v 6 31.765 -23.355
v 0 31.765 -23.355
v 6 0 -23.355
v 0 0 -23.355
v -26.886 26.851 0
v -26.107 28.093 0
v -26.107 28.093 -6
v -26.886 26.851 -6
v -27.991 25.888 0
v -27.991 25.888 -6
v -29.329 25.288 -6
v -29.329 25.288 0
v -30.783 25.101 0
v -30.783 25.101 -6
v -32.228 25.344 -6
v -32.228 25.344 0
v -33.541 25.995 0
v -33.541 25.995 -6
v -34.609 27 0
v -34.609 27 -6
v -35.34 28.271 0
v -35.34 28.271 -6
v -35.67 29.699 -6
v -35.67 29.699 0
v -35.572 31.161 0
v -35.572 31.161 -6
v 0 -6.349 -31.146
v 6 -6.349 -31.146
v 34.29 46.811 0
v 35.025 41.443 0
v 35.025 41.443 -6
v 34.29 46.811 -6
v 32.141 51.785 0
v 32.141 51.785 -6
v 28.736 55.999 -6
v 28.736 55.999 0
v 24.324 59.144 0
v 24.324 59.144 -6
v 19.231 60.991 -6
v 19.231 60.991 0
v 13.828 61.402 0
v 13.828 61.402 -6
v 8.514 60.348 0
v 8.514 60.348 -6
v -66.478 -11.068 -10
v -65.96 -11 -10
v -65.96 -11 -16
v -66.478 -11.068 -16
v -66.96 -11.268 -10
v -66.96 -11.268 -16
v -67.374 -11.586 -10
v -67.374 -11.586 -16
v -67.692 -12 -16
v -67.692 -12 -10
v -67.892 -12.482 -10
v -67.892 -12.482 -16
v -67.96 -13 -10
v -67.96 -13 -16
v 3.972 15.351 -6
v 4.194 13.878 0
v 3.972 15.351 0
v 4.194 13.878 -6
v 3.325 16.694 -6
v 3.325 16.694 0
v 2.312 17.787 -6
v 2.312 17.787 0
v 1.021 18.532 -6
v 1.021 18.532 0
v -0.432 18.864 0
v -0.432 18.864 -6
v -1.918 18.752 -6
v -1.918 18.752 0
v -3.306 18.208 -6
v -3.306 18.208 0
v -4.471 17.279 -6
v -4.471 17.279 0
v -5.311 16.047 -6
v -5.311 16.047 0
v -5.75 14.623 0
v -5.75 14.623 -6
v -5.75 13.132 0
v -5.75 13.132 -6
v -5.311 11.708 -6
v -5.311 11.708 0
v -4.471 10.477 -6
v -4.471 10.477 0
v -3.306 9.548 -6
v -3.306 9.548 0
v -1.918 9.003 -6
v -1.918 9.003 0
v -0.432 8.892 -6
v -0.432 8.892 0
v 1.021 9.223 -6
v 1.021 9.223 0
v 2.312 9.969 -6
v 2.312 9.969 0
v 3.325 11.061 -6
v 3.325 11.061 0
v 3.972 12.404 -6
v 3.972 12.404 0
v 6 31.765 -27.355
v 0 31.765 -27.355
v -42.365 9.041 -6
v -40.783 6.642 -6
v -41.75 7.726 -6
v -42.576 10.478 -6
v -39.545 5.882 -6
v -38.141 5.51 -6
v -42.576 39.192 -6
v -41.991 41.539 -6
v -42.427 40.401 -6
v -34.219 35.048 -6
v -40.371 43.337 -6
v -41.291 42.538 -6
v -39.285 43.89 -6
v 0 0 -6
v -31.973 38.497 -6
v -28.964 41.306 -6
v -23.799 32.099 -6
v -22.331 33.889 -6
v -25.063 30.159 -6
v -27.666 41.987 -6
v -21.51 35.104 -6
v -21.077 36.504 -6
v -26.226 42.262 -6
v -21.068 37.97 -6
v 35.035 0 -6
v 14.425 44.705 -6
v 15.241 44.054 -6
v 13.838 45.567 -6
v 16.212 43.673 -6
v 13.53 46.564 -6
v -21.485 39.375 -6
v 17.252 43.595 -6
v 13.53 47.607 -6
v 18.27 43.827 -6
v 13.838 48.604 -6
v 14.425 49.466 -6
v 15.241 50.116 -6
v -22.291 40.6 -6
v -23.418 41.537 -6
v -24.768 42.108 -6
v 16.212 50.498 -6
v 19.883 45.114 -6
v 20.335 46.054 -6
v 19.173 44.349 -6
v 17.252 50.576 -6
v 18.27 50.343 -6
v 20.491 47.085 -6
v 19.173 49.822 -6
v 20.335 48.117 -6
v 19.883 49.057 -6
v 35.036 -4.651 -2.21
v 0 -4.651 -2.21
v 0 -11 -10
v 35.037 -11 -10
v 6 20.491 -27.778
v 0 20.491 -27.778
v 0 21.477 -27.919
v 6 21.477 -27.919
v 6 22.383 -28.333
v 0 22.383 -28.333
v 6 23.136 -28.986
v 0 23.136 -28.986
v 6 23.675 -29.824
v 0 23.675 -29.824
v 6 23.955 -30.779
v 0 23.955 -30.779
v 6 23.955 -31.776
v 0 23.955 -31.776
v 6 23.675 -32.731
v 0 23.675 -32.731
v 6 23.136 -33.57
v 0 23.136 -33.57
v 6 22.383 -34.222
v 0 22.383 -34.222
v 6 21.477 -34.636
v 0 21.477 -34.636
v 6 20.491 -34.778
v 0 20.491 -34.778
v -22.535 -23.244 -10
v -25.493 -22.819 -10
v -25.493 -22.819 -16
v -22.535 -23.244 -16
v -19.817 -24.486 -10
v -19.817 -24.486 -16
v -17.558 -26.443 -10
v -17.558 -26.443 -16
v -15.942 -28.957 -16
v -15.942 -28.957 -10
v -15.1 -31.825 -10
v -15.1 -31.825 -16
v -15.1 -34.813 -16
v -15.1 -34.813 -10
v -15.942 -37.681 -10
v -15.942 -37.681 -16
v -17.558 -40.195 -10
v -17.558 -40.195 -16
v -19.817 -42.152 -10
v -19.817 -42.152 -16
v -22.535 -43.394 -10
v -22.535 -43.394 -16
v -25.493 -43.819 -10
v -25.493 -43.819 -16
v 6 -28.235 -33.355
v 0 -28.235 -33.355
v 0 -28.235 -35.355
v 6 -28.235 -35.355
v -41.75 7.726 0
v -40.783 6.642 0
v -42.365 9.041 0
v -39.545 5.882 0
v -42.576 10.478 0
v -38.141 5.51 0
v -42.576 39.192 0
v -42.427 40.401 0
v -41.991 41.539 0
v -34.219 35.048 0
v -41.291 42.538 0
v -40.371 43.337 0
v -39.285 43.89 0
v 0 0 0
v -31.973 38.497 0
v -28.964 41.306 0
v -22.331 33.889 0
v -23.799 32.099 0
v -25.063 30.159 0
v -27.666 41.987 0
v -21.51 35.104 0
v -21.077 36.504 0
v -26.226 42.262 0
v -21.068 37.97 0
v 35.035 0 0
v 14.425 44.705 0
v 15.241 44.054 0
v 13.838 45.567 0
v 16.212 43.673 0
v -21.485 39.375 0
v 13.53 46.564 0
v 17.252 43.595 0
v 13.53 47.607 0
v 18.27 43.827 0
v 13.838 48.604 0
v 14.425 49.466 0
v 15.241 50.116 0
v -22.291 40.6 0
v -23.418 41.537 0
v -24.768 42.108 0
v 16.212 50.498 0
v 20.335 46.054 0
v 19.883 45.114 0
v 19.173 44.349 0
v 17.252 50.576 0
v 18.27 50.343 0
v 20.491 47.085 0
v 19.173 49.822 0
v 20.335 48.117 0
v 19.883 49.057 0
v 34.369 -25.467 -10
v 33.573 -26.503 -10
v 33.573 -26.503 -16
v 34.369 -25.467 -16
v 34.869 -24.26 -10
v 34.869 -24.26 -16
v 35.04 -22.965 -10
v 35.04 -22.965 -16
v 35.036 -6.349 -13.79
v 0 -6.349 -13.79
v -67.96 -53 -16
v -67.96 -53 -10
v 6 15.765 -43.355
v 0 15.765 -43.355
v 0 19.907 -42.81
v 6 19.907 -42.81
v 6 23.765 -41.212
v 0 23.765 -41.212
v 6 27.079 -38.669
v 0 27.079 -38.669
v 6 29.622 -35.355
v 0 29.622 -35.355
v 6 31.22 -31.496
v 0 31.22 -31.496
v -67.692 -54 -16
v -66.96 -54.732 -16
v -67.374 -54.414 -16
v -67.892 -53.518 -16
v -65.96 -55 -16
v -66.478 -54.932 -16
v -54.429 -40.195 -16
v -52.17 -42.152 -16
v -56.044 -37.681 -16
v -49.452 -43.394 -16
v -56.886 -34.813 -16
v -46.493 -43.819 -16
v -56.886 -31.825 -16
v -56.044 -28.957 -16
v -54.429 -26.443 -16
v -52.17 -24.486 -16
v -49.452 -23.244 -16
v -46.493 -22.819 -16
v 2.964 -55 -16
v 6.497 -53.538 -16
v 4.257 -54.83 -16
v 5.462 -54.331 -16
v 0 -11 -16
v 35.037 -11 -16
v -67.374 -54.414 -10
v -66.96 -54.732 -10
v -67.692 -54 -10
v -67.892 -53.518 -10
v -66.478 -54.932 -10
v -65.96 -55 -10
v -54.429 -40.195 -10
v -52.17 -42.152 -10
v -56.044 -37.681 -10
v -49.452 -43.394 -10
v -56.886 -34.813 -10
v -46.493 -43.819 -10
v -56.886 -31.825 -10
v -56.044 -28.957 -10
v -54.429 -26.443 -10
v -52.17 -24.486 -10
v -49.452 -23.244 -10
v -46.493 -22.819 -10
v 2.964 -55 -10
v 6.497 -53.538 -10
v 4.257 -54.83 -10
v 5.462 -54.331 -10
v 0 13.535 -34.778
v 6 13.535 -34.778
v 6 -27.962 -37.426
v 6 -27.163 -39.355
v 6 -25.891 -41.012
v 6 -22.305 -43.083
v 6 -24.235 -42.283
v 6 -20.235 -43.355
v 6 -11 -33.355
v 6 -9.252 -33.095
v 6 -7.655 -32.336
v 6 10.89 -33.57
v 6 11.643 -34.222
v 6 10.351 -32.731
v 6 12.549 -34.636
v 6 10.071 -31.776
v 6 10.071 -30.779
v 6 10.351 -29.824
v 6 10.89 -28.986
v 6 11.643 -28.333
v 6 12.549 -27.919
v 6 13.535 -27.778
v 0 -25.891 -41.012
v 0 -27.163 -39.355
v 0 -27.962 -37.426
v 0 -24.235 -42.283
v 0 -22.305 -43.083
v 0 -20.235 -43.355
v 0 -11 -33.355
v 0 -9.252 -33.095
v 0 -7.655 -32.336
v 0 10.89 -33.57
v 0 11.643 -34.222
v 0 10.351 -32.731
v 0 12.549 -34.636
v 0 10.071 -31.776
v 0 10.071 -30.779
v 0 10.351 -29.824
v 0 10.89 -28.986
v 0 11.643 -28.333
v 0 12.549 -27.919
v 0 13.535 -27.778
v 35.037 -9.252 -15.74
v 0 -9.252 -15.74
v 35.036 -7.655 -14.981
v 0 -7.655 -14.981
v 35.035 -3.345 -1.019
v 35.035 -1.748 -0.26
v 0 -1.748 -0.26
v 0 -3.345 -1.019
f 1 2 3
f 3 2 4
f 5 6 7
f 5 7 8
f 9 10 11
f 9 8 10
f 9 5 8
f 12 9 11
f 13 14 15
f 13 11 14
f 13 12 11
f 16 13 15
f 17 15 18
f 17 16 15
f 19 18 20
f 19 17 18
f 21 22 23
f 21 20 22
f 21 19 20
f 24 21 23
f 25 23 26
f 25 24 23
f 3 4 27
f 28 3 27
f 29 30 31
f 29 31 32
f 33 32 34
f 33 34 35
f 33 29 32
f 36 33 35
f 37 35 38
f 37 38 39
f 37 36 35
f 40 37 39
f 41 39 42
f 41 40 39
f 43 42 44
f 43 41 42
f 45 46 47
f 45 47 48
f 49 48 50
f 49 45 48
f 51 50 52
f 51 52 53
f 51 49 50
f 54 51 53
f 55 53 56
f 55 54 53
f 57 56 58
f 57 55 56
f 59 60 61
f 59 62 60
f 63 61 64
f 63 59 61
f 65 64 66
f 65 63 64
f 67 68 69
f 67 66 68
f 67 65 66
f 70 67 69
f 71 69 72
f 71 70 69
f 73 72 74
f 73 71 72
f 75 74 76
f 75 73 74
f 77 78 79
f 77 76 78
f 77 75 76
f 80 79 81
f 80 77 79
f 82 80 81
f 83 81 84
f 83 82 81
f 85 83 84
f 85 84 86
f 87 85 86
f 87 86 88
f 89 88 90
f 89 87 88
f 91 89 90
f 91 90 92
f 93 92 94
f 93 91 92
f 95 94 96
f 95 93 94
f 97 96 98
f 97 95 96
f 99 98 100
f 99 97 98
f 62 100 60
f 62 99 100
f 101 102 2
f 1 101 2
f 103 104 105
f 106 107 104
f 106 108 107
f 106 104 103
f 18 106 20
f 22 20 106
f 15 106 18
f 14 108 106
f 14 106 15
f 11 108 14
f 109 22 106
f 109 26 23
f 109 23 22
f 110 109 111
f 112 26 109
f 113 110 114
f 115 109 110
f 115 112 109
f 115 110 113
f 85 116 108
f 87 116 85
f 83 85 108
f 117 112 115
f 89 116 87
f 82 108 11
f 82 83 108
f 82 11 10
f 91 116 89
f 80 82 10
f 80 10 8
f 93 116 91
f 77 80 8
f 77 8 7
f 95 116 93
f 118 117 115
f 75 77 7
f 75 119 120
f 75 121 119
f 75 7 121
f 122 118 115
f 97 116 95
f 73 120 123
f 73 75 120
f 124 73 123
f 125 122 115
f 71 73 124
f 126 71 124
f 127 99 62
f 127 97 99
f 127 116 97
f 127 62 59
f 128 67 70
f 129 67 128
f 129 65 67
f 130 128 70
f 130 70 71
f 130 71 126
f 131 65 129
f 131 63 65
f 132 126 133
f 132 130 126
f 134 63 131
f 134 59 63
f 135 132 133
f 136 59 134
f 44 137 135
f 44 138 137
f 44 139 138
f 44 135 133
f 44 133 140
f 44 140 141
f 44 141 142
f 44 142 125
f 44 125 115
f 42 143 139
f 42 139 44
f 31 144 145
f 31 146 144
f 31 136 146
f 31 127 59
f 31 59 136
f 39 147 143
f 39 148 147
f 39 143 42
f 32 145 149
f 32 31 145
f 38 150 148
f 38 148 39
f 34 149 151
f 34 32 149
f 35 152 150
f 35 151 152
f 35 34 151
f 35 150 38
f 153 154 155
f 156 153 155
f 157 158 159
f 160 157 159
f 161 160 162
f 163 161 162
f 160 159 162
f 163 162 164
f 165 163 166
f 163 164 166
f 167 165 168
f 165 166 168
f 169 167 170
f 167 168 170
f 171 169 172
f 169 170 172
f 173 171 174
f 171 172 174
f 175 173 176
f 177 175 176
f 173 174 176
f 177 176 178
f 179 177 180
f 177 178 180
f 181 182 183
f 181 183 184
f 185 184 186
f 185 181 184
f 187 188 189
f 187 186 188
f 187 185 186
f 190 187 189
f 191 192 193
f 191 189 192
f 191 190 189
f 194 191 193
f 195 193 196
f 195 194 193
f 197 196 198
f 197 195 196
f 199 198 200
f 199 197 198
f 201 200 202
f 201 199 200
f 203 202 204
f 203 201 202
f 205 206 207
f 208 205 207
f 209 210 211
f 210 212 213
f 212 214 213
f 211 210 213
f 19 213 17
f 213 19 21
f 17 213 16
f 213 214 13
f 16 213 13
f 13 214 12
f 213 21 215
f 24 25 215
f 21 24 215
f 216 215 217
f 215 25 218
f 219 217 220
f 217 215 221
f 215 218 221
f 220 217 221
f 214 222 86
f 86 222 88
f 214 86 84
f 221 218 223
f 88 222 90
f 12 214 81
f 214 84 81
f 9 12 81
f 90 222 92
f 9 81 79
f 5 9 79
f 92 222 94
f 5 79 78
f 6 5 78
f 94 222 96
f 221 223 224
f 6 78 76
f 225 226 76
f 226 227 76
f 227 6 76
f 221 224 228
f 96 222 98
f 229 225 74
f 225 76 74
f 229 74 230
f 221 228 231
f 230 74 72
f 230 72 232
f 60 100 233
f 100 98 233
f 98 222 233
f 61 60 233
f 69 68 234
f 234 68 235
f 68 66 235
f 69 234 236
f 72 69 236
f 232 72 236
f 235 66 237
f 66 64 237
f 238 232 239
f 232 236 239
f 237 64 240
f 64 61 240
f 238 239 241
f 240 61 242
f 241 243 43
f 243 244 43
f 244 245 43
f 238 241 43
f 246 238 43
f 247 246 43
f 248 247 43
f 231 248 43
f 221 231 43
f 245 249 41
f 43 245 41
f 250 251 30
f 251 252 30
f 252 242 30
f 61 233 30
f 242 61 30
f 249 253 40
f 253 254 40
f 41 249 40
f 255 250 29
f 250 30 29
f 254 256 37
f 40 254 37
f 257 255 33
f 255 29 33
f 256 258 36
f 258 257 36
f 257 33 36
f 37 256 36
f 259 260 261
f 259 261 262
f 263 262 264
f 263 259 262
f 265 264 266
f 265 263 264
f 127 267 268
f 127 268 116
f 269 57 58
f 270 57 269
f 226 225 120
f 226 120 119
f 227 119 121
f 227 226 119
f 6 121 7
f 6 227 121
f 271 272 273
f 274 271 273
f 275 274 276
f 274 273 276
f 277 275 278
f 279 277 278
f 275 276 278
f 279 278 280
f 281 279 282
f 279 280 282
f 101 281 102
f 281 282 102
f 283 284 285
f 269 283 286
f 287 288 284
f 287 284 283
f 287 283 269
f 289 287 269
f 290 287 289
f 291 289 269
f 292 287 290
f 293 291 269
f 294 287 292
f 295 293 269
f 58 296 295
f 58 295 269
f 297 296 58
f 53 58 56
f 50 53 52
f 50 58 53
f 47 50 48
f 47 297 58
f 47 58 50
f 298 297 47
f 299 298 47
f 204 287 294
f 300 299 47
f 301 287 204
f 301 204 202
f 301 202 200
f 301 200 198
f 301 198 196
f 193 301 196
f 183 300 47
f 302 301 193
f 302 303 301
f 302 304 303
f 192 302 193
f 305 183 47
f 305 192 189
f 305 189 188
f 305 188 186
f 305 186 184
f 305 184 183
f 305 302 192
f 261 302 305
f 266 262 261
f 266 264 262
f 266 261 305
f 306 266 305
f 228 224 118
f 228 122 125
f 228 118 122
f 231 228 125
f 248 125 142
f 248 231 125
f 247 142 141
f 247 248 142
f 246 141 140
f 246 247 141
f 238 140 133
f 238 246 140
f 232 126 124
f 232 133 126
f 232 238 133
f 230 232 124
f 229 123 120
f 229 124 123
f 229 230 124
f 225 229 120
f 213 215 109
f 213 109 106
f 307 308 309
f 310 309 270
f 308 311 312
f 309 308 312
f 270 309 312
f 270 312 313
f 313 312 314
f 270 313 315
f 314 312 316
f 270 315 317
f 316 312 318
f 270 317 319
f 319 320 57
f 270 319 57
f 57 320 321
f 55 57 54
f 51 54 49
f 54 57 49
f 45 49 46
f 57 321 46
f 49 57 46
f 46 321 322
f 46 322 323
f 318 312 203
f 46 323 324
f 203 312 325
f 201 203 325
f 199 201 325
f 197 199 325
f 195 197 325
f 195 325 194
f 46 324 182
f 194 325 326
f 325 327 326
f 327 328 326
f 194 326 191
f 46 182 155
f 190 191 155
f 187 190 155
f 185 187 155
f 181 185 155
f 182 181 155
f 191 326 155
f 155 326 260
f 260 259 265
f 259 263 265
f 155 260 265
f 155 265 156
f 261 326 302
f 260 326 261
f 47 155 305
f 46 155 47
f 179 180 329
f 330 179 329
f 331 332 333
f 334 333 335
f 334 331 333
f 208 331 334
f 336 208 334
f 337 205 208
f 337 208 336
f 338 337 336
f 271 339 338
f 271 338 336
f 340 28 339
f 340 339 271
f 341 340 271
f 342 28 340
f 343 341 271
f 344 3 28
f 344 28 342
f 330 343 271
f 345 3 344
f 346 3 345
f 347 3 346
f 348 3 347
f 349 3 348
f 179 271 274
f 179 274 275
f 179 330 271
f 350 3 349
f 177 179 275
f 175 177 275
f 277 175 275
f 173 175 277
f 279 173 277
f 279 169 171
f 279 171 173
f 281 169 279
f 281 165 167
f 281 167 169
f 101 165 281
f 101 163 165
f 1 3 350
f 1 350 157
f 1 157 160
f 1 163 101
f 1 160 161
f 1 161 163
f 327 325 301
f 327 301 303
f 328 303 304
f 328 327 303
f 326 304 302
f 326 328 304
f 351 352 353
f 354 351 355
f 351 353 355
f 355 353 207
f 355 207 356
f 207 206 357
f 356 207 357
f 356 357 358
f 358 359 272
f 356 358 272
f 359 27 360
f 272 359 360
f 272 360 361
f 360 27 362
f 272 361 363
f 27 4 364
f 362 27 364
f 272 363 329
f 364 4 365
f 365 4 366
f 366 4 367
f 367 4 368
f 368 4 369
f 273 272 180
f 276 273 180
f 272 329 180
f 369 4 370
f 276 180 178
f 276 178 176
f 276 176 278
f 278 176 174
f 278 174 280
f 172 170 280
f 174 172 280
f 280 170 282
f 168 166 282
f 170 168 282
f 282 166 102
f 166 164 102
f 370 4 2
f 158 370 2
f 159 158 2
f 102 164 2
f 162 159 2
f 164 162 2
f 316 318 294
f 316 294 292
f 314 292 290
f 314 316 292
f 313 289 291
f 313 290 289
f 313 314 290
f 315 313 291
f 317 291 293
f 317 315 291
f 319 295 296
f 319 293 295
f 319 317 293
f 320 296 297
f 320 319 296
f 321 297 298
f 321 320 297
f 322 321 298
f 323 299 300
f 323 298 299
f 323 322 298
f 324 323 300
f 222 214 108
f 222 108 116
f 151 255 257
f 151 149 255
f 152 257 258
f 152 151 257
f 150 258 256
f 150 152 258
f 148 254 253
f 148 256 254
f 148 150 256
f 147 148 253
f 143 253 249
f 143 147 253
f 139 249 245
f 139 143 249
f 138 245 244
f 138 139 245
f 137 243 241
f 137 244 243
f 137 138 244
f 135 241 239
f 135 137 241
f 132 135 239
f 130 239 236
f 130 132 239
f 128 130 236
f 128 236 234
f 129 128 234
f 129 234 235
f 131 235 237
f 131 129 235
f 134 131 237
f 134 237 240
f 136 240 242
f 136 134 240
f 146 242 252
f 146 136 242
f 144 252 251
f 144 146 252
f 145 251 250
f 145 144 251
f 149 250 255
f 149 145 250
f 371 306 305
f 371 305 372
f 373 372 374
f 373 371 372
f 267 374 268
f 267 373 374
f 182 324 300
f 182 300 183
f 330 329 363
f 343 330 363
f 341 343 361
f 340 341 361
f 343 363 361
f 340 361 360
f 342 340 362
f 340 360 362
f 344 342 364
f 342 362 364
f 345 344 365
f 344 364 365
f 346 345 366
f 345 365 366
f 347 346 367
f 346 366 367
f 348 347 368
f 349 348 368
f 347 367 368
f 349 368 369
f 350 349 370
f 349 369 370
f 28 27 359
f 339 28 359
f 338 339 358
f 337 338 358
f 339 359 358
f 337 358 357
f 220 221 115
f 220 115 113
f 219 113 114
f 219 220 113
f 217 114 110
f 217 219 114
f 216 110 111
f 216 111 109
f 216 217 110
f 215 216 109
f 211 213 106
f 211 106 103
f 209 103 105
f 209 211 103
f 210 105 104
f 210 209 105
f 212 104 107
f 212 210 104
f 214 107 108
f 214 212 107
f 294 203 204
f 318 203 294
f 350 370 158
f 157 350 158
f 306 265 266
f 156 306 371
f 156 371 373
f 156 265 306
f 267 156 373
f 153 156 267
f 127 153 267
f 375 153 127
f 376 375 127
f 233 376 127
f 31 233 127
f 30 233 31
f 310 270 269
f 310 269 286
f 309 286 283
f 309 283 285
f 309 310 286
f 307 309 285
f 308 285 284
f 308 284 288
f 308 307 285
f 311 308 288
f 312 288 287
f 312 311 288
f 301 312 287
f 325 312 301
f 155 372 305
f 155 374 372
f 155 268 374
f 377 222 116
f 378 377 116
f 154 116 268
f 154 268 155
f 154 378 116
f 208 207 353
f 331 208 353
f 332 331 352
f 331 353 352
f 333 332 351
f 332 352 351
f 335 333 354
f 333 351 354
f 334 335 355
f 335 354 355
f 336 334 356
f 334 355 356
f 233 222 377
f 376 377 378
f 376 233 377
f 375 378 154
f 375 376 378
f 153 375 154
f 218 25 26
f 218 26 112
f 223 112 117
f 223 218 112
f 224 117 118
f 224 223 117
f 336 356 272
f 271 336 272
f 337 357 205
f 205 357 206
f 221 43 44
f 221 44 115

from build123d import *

# Parameters (mm, degrees)
F0_R     = 5
F0_R_2   = 3.500005
F2_DEPTH = 50
F1_W     = 56.675658
F1_H     = 6
F1_W_2   = 79.885715
F3_DEPTH = 100
F4_DEPTH = 6


with BuildPart() as f2:
    # F0 (on Top) → F2 (new body, symmetric)
    with BuildSketch(Plane.XY):
        with BuildLine():
            Line((0, -11), (-65.959916, -11))
            ThreePointArc((-65.959916, -11), (-67.37413, -11.585786), (-67.959916, -13))
            Line((-67.959916, -13), (-67.959916, -53))
            ThreePointArc((-67.959916, -53), (-67.37413, -54.414214), (-65.959916, -55))
            Line((-65.959916, -55), (2.964258, -55))
            ThreePointArc((2.964258, -55), (4.875939, -54.620117), (6.497133, -53.538191))
            Line((6.497133, -53.538191), (33.572958, -26.503055))
            ThreePointArc((33.572958, -26.503055), (34.658762, -24.880017), (35.040084, -22.964863))
            Line((35.040084, -22.964863), (35.024943, 41.443182))
            ThreePointArc((35.024943, 41.443182), (26.636911, 57.721619), (8.513795, 60.348262))
            Line((8.513795, 60.348262), (-39.285382, 43.890292))
            ThreePointArc((-39.285382, 43.890292), (-41.671495, 42.059758), (-42.575934, 39.191592))
            Line((-42.575934, 39.191592), (-42.575934, 10.478197))
            ThreePointArc((-42.575934, 10.478197), (-41.306069, 7.148618), (-38.141498, 5.510286))
            Line((-38.141498, 5.510286), (0, 0))
            Line((0, 0), (0, -11))
        make_face()
        with BuildLine():
            ThreePointArc((-46.493332, -43.818958), (-56.993332, -33.318958), (-46.493332, -22.818958))
            Line((-46.493332, -22.818958), (-25.493332, -22.818958))
            ThreePointArc((-25.493332, -22.818958), (-14.993332, -33.318958), (-25.493332, -43.818958))
            Line((-25.493332, -43.818958), (-46.493332, -43.818958))
        make_face(mode=Mode.SUBTRACT)
        with BuildLine():
            ThreePointArc((-26.106866, 28.092718), (-32.228269, 25.343574), (-35.572339, 31.161354))
            ThreePointArc((-35.572339, 31.161354), (-33.200295, 36.840932), (-28.964332, 41.306447))
            ThreePointArc((-28.964332, 41.306447), (-22.291275, 40.59957), (-22.331264, 33.889296))
            ThreePointArc((-22.331264, 33.889296), (-24.457616, 31.146388), (-26.106866, 28.092718))
        make_face(mode=Mode.SUBTRACT)
        with Locations((-0.805872, 13.877689)):
            Circle(F0_R, mode=Mode.SUBTRACT)
        with Locations((16.990938, 47.085301)):
            Circle(F0_R_2, mode=Mode.SUBTRACT)
    extrude(amount=F2_DEPTH, both=True)

    # F1 (on Right) → F3 (intersect, symmetric)
    with BuildSketch(Plane.YZ):
        with Locations((-39.337829, -13)):
            Rectangle(F1_W, F1_H)
        with BuildLine():
            Line((0, -6), (0, 0))
            ThreePointArc((0, 0), (-2.574616, -0.580466), (-4.651073, -2.209549))
            Line((-4.651073, -2.209549), (-11, -10))
            Line((-11, -10), (-11, -16))
            ThreePointArc((-11, -16), (-8.425384, -15.419534), (-6.348927, -13.790451))
            Line((-6.348927, -13.790451), (0, -6))
        make_face()
        with Locations((39.942857, -3)):
            Rectangle(F1_W_2, F1_H)
    extrude(amount=F3_DEPTH, both=True, mode=Mode.INTERSECT)


with BuildPart() as f4:
    # F1 (on Right) → F4 (new body)
    with BuildSketch(Plane.YZ):
        with BuildLine():
            Line((31.765494, -23.355214), (0, -23.355214))
            Line((0, -23.355214), (-6.348927, -31.145665))
            ThreePointArc((-6.348927, -31.145665), (-8.425384, -32.774748), (-11, -33.355214))
            Line((-11, -33.355214), (-28.234506, -33.355214))
            Line((-28.234506, -33.355214), (-28.234506, -35.355214))
            ThreePointArc((-28.234506, -35.355214), (-25.89136, -41.012068), (-20.234506, -43.355214))
            Line((-20.234506, -43.355214), (15.765494, -43.355214))
            ThreePointArc((15.765494, -43.355214), (27.079202, -38.668922), (31.765494, -27.355214))
            Line((31.765494, -27.355214), (31.765494, -23.355214))
        make_face()
        with BuildLine():
            ThreePointArc((13.535125, -34.777541), (10.035125, -31.277541), (13.535125, -27.777541))
            Line((13.535125, -27.777541), (20.490863, -27.777541))
            ThreePointArc((20.490863, -27.777541), (23.990863, -31.277541), (20.490863, -34.777541))
            Line((20.490863, -34.777541), (13.535125, -34.777541))
        make_face(mode=Mode.SUBTRACT)
    extrude(amount=F4_DEPTH)


solid = Compound([f2.part, f4.part])
